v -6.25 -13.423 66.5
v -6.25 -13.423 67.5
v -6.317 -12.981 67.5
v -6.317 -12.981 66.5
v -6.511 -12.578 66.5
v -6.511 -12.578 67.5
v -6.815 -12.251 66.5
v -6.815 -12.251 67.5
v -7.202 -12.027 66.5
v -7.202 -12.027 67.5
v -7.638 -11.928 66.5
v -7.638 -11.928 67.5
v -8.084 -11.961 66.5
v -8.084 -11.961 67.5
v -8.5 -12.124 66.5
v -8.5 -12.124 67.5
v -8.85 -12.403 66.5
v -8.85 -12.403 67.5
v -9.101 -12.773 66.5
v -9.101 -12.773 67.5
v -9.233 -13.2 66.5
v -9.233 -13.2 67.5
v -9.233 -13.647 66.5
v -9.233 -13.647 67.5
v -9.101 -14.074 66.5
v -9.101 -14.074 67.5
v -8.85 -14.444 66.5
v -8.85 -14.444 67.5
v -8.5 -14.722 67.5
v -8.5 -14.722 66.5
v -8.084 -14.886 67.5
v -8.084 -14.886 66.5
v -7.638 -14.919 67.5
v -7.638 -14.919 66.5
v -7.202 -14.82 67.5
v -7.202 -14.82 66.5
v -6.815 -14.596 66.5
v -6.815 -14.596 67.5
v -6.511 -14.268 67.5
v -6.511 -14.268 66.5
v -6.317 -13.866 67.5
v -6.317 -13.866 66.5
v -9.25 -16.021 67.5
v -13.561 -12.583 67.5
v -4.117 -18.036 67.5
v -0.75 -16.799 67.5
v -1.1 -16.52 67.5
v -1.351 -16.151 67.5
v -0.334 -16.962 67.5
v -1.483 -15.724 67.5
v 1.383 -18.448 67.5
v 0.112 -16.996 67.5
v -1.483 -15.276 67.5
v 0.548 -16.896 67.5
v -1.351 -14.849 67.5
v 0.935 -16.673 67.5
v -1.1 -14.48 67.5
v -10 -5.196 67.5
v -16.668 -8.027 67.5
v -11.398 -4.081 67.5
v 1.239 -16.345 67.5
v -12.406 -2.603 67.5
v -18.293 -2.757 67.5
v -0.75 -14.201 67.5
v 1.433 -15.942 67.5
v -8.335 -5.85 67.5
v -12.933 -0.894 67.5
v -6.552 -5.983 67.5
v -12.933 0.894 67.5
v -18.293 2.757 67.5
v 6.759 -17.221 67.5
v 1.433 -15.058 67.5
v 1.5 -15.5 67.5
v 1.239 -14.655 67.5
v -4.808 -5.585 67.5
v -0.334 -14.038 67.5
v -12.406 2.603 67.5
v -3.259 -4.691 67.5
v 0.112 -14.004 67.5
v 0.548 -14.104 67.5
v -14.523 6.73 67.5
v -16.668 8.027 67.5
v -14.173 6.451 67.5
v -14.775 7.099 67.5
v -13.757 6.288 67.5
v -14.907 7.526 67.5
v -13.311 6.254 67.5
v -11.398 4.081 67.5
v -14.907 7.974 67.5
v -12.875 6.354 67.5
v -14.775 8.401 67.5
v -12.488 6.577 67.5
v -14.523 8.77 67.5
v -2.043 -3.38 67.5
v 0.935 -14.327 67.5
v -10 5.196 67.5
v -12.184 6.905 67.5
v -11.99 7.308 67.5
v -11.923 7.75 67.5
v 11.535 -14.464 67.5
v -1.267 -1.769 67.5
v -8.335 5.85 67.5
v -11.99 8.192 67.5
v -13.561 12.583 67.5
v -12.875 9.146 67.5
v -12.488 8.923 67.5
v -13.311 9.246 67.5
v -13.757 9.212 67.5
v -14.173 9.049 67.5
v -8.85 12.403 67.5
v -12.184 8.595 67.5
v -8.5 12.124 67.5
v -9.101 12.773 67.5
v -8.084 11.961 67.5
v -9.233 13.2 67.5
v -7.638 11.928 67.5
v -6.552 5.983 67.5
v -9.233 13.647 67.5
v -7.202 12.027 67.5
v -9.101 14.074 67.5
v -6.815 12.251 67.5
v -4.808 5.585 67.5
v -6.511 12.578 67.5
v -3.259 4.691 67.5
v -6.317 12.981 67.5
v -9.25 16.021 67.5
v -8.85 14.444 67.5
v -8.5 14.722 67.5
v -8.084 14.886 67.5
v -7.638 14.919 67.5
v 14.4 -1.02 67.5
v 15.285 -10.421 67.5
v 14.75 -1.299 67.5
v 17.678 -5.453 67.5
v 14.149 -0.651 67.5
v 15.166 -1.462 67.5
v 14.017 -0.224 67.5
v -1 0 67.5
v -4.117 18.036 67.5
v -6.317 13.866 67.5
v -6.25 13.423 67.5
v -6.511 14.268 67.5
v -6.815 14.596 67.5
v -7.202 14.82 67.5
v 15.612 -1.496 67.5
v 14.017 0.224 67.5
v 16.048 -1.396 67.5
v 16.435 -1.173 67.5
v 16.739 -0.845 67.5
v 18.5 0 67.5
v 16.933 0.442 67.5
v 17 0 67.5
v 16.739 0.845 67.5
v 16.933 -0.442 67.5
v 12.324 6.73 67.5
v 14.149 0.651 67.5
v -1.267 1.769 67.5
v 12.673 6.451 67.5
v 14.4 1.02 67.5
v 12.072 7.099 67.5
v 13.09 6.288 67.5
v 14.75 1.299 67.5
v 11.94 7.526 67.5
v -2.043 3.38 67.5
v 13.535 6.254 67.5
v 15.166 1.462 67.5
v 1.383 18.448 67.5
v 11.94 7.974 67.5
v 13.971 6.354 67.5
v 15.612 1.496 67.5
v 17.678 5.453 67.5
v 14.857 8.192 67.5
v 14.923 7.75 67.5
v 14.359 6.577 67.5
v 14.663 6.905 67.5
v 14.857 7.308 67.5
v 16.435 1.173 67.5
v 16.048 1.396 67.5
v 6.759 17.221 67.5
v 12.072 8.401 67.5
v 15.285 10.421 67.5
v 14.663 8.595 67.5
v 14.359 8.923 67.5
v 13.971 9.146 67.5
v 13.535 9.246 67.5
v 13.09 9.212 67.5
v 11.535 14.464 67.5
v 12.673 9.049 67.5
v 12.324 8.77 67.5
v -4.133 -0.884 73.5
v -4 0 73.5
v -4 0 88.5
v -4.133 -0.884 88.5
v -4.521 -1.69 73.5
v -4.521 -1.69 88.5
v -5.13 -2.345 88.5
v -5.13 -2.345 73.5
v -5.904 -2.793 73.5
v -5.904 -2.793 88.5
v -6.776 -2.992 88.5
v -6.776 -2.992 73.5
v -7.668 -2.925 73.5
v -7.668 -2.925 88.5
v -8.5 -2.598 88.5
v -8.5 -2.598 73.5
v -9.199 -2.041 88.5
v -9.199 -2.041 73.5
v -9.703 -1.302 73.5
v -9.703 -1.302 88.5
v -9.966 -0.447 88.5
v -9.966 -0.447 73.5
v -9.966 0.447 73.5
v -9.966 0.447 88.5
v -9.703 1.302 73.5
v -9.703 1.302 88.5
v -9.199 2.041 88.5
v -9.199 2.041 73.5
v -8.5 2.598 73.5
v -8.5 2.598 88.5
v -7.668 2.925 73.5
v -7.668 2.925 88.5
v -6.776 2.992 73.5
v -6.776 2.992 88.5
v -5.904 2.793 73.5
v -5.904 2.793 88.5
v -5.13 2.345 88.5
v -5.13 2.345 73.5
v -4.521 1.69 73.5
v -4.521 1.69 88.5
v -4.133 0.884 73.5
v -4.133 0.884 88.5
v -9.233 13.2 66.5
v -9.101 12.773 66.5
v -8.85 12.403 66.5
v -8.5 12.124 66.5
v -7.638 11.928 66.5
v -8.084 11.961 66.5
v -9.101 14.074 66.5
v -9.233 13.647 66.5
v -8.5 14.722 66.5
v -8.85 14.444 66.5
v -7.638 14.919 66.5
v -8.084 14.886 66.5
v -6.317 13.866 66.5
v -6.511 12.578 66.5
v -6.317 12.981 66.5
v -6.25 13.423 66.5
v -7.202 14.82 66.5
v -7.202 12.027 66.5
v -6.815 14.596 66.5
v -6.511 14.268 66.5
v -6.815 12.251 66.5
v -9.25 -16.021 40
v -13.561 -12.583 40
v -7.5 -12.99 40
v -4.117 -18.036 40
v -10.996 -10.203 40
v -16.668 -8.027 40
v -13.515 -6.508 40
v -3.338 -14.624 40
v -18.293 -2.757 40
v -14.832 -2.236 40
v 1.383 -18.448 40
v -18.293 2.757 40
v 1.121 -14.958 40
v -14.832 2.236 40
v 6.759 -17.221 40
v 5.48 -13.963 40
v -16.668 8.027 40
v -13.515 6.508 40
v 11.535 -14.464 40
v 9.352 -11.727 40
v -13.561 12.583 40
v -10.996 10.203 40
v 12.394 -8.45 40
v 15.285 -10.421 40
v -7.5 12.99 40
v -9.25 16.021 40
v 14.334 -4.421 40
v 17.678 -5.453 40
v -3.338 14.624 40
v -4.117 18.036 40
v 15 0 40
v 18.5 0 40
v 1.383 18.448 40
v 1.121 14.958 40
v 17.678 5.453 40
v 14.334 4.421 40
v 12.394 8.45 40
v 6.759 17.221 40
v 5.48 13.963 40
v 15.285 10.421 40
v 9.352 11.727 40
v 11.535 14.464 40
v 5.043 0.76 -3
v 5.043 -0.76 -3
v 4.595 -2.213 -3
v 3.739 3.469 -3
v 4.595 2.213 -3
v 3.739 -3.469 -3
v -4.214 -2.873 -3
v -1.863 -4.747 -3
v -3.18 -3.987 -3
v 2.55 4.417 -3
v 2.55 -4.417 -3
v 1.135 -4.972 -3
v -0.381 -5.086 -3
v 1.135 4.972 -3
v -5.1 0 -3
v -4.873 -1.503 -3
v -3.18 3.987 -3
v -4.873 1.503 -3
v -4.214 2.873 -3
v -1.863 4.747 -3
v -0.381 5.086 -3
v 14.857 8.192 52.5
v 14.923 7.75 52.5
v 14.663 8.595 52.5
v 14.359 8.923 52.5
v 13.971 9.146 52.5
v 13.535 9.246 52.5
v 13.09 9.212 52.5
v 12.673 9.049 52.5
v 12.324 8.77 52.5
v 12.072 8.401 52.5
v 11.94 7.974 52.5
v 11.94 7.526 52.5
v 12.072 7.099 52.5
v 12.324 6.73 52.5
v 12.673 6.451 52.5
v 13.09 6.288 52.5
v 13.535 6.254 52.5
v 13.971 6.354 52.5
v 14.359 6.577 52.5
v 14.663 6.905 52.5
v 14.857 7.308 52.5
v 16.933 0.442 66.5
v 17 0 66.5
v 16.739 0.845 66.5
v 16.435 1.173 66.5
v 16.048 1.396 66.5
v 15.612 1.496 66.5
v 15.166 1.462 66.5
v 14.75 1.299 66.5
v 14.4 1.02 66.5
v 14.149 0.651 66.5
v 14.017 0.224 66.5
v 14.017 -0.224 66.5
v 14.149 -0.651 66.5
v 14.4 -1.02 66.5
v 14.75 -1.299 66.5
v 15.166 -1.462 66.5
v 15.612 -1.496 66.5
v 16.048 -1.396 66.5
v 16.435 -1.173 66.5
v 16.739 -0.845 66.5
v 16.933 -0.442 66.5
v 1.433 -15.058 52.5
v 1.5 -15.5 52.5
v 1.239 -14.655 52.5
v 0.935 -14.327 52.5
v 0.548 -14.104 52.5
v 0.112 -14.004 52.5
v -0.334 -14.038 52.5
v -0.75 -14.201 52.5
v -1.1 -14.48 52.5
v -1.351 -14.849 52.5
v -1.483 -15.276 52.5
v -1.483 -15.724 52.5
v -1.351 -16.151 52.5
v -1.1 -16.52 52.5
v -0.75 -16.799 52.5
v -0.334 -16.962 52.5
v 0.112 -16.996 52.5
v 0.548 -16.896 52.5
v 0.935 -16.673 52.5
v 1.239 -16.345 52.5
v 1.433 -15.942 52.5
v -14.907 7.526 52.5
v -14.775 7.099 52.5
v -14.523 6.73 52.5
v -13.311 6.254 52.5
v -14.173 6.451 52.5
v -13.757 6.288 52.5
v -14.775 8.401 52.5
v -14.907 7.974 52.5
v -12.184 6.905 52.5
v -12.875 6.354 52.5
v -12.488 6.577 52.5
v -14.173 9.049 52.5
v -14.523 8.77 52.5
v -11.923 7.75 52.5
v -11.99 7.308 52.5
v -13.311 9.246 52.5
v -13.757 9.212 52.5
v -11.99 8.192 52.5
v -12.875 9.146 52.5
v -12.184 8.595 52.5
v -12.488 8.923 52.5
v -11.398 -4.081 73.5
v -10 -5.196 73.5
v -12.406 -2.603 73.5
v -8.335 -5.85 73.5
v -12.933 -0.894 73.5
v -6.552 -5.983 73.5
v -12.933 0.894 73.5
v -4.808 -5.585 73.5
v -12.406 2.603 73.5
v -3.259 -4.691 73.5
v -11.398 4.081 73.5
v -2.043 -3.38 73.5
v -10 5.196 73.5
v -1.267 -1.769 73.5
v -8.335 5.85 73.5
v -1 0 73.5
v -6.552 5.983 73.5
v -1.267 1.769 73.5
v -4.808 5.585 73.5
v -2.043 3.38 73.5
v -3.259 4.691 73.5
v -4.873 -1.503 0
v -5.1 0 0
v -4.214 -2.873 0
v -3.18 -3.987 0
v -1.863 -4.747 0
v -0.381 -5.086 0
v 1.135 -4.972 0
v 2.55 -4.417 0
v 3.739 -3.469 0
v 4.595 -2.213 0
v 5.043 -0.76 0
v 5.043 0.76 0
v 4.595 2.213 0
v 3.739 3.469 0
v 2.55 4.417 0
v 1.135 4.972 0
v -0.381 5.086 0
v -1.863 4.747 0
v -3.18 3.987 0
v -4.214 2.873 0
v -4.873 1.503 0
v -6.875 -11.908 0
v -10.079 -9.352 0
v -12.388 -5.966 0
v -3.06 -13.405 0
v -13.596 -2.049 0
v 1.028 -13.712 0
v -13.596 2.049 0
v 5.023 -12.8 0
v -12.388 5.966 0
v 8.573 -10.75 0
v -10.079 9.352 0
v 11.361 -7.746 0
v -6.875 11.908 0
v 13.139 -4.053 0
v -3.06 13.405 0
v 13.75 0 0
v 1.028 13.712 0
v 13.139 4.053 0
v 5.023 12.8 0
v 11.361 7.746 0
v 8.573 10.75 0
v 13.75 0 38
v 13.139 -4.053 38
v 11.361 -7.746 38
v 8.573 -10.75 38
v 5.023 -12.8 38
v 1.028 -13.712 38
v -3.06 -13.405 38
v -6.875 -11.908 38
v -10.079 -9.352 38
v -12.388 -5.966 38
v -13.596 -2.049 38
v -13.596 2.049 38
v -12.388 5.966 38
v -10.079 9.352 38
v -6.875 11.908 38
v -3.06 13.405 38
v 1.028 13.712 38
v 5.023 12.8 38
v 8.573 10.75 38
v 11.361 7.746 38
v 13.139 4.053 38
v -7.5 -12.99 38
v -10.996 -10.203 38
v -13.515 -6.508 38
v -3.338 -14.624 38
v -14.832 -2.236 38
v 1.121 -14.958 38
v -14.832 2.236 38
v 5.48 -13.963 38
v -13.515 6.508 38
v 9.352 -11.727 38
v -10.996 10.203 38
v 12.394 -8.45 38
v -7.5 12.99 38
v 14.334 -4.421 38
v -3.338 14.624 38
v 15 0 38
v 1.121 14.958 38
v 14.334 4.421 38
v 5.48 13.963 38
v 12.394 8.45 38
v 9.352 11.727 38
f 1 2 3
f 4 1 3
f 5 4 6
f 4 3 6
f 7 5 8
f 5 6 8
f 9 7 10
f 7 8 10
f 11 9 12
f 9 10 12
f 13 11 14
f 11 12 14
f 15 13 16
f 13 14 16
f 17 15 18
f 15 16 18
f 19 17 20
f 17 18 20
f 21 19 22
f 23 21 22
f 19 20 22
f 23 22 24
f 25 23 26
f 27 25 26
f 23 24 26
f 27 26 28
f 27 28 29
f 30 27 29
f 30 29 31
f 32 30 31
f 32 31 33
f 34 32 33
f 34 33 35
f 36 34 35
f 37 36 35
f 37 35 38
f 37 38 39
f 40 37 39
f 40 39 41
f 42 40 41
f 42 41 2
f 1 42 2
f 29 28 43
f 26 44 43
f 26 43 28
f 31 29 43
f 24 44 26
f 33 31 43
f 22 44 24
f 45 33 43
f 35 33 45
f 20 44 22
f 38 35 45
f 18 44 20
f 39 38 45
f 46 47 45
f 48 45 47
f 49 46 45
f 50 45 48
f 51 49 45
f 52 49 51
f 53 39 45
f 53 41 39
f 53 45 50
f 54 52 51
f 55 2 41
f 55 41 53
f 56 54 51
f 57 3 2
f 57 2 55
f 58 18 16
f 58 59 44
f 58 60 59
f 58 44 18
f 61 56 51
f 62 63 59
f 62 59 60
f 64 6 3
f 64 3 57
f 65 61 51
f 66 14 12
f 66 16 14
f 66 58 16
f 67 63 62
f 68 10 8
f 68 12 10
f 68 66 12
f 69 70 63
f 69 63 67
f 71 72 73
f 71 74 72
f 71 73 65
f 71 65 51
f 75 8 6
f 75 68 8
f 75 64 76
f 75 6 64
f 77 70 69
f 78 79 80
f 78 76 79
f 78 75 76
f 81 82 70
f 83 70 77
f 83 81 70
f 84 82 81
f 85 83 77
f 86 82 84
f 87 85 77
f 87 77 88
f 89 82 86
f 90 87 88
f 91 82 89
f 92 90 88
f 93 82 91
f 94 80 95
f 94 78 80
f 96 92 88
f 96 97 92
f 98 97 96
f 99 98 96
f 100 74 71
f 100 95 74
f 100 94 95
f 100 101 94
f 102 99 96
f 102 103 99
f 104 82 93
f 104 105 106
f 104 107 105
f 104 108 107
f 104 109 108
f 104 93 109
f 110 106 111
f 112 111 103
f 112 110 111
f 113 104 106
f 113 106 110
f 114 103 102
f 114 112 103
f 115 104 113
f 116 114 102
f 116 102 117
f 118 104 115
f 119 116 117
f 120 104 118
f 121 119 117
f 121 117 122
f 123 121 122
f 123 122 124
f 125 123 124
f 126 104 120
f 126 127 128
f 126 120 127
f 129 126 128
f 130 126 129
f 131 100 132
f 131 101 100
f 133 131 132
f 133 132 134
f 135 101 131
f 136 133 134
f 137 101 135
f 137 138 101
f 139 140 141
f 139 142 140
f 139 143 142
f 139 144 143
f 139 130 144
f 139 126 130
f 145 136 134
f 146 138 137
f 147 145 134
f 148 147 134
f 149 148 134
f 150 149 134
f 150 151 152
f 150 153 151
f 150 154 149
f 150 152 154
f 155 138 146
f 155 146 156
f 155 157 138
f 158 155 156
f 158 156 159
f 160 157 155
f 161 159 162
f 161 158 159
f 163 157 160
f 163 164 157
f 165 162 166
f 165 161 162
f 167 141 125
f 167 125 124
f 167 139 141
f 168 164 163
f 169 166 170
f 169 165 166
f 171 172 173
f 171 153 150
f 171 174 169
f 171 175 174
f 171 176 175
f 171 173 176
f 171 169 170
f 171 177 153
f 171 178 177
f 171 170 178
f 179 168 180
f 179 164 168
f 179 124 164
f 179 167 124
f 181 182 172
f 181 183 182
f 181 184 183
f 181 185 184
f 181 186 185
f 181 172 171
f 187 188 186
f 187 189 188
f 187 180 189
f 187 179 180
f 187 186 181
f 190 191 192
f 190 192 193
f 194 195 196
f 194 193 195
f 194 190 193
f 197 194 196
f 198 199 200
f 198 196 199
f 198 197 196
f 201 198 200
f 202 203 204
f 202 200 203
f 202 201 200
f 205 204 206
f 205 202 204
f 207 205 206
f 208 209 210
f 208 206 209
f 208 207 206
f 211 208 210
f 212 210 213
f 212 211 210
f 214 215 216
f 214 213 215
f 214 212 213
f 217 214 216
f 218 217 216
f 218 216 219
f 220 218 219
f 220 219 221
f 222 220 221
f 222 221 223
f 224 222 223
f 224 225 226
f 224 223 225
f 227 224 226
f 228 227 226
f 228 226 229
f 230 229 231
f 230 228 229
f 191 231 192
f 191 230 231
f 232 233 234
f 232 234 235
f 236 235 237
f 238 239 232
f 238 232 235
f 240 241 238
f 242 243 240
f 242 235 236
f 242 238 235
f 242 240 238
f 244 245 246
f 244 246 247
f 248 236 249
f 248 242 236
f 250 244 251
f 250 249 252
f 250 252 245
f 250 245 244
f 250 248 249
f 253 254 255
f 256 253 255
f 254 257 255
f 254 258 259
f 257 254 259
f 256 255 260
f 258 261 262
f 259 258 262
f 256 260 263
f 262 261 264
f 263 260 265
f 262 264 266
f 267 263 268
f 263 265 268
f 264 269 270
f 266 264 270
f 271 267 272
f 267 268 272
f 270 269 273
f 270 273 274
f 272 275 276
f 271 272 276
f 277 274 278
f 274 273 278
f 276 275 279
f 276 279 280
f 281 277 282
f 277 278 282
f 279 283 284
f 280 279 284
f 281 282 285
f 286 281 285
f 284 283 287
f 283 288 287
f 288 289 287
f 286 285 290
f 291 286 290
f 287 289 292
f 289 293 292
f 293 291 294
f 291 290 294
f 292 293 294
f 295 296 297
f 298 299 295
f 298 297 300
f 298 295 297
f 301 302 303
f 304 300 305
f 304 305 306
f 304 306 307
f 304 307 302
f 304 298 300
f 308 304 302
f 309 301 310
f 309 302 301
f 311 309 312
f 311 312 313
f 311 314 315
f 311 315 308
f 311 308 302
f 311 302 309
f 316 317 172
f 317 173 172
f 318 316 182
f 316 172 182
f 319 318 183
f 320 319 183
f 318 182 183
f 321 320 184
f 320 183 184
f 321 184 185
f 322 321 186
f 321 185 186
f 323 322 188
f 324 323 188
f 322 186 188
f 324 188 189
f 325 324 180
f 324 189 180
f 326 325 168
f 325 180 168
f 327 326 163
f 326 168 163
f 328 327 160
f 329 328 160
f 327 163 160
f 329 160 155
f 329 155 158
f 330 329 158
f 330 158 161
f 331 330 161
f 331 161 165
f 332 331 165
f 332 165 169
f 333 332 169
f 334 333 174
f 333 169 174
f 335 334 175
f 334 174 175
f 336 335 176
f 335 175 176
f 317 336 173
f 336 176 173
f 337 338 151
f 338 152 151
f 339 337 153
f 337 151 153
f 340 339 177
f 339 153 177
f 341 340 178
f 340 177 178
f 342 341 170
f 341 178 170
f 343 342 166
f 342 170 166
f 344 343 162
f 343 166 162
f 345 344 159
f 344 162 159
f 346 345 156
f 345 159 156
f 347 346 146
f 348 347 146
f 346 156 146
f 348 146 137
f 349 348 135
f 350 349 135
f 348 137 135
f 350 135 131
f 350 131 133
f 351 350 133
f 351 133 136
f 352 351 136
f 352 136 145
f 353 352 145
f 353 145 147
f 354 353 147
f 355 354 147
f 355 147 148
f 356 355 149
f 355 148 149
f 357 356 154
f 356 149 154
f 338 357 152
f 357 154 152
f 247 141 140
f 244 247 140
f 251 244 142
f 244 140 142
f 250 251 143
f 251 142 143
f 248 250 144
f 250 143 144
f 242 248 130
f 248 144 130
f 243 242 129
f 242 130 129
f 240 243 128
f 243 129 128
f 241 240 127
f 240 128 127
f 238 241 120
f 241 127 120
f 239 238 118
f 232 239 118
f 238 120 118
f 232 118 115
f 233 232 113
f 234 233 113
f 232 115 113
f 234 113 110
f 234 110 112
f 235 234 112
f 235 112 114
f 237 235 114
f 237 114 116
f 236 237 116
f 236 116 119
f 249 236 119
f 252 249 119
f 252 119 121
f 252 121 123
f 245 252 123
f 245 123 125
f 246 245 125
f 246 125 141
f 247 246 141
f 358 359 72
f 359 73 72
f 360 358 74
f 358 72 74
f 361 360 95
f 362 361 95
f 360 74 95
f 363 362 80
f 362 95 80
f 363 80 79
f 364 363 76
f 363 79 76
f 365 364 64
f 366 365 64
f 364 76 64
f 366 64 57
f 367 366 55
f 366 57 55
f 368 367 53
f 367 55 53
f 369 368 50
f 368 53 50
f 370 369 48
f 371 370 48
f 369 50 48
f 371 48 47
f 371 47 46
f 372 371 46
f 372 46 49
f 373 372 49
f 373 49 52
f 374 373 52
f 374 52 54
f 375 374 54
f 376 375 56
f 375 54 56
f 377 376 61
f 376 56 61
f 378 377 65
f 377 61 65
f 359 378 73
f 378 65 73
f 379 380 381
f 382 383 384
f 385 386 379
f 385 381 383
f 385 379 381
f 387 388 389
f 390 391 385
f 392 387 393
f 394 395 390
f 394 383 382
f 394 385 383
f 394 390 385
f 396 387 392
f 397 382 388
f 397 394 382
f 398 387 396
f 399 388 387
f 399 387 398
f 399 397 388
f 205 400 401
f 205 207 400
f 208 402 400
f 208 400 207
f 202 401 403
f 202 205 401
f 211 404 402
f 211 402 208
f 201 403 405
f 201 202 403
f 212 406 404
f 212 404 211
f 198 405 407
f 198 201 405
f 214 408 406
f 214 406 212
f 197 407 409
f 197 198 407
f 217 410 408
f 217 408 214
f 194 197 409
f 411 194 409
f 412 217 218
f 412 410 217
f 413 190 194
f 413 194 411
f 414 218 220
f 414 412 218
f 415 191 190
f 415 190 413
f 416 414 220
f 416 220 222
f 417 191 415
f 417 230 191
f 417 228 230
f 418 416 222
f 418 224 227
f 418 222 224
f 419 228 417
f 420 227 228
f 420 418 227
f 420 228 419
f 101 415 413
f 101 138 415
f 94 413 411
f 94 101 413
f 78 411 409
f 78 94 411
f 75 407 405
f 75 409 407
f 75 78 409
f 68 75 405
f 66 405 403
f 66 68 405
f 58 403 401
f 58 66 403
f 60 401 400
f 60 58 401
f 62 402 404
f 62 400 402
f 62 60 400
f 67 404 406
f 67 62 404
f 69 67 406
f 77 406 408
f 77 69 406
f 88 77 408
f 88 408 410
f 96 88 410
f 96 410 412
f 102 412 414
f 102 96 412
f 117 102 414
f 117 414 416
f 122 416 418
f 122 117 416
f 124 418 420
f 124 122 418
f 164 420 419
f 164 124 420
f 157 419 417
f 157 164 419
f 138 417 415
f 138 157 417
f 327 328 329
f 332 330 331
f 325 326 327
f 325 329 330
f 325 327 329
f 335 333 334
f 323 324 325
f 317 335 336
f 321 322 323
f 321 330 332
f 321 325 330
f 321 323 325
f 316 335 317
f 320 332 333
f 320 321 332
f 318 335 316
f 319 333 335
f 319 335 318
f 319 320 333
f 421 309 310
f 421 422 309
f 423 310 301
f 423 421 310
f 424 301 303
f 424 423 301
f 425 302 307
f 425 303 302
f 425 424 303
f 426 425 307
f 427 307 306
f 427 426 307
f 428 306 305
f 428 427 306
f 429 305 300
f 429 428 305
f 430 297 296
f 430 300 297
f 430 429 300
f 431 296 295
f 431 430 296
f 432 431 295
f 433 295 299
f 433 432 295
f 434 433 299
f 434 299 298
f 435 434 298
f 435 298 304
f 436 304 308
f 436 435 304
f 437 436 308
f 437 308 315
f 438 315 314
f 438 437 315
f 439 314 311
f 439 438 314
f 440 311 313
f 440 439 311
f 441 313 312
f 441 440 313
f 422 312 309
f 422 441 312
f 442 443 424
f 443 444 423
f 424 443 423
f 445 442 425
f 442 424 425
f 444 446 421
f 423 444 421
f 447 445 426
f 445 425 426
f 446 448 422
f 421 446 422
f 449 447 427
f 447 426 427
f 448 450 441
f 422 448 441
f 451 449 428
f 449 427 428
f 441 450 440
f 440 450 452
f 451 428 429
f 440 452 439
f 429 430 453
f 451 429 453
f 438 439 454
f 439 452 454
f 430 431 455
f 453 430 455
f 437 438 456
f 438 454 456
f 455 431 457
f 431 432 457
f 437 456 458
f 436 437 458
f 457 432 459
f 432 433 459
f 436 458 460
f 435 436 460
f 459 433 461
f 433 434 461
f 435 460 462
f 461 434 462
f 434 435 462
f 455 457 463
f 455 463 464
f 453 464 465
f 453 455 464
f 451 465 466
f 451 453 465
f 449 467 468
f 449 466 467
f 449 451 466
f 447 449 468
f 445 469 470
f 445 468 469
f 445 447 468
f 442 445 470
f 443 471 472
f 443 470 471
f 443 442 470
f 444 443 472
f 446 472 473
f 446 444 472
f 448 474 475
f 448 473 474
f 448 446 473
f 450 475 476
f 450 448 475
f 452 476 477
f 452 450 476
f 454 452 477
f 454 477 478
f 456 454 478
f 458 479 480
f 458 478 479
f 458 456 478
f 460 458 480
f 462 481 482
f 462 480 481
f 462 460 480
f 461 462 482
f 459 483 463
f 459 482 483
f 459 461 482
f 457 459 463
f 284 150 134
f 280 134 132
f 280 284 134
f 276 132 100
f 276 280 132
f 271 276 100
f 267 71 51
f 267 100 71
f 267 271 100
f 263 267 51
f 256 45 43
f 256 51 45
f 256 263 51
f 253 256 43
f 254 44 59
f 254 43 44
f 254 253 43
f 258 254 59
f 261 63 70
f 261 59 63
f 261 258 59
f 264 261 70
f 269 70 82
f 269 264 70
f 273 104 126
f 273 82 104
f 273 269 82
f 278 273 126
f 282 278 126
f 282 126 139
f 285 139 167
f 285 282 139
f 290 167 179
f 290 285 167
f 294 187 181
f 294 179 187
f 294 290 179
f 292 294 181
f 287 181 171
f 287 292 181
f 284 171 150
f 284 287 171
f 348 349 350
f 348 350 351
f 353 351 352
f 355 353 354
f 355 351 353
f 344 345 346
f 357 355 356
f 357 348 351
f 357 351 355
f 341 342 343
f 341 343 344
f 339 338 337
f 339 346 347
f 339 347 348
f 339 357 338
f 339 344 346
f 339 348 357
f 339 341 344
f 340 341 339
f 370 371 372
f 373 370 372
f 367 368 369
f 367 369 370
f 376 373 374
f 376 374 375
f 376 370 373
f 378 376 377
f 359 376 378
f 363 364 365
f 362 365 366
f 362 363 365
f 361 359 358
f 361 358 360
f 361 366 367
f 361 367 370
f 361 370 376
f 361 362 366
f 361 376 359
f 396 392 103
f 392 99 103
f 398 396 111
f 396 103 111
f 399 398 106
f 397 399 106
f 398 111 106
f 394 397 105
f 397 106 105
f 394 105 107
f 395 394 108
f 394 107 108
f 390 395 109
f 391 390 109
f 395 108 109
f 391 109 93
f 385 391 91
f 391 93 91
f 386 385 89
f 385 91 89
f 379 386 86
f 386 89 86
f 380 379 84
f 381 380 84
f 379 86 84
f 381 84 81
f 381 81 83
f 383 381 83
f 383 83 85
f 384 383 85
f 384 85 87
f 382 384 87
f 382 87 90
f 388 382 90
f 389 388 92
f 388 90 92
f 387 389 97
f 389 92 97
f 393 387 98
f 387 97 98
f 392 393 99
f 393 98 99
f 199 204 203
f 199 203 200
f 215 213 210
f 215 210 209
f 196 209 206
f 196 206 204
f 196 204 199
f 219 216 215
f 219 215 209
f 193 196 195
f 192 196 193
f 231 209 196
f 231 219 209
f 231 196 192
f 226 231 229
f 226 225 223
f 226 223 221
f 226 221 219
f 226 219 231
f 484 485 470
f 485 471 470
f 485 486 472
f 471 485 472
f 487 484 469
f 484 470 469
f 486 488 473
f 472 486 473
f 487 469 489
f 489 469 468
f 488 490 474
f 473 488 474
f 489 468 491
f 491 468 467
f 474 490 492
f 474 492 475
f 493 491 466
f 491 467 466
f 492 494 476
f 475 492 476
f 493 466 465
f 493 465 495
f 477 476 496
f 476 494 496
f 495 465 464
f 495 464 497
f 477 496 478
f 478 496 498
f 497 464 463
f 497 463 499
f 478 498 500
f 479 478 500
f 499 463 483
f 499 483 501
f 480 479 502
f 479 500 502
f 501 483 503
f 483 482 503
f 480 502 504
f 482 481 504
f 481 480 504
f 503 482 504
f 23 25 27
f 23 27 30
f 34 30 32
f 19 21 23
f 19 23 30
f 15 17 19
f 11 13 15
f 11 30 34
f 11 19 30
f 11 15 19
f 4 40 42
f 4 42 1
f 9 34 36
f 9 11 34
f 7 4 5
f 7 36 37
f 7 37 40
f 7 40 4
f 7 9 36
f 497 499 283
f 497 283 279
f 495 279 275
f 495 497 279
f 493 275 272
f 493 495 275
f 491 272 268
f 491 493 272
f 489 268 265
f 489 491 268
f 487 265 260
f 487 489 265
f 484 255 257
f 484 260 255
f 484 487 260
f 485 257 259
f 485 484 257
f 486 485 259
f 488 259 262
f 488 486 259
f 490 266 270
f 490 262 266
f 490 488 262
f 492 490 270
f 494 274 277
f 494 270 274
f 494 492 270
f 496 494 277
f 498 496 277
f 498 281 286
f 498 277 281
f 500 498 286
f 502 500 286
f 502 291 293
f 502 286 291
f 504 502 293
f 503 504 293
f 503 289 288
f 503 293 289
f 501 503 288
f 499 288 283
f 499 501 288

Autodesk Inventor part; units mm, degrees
ref_plane "YZ Plane" through (0, 0, 0) normal (1, 0, 0) x (0, 1, 0)
ref_plane "XZ Plane" through (0, 0, 0) normal (0, 1, 0) x (-1, 0, 0)
ref_plane "XY Plane" through (0, 0, 0) normal (0, 0, 1) x (1, 0, 0)
sketch "スケッチ1" plane through (0, 0, 0) normal (0, 0, 1) x (1, 0, 0)
  circle A0 centre (0, 0) radius 13.75
  dimension "d0" = 27.5
extrude "押し出し1" add sketch "スケッチ1" along normal blind 38
sketch "スケッチ2" plane through (0, 0, 38) normal (0, 0, 1) x (1, 0, 0)
  circle A0 centre (0, 0) radius 15
  dimension "d3" = 30
extrude "押し出し2" add sketch "スケッチ2" along normal blind 2
sketch "スケッチ3" plane through (0, 0, 40) normal (0, 0, 1) x (1, 0, 0)
  circle A0 centre (0, 0) radius 18.5
  dimension "d6" = 37
extrude "押し出し3" add sketch "スケッチ3" along normal blind 27.5
sketch "スケッチ4" plane through (0, 0, 0) normal (0, 0, -1) x (-1, 0, 0)
  circle A0 centre (0, 0) radius 5.1
  dimension "d9" = 10.2
extrude "押し出し4" add sketch "スケッチ4" along normal blind 3
sketch "スケッチ5" plane through (0, 0, 67.5) normal (0, 0, 1) x (1, 0, 0)
  circle A0 centre (-7, 0) radius 6
  point P0 (0, 0)
  dimension "d12" = 12
extrude "押し出し5" add sketch "スケッチ5" along normal blind 6
sketch "スケッチ6" plane through (-7, 0, 73.5) normal (0, 0, 1) x (1, 0, 0)
  circle A0 centre (0, 0) radius 3
  point P0 (7, 0)
  dimension "d15" = 6
extrude "押し出し6" add sketch "スケッチ6" along normal blind 15
sketch "スケッチ7" plane through (0, 0, 67.5) normal (0, 0, 1) x (1, 0, 0)
  circle A0 centre (-7.75, -13.4234) radius 1.5
  circle A1 centre (-7.75, 13.4234) radius 1.5
  circle A2 centre (15.5, 0) radius 1.5
  circle A3 centre (0, -15.5) radius 1.5
  circle A4 centre (-13.4234, 7.75) radius 1.5
  circle A5 centre (13.4234, 7.75) radius 1.5
  point P0 (0, 0)
  point P1 (0, 0)
  point P2 (0, 0)
  dimension "d19" = 3
  dimension "d20" = 3
  dimension "d21" = 3
  dimension "d22" = 3
  dimension "d23" = 3
  dimension "d24" = 3
extrude "押し出し7" cut sketch "スケッチ7" against normal blind 15 contours A3 | A4 | A5
sketch "スケッチ8" plane through (0, 0, 67.5) normal (0, 0, 1) x (1, 0, 0)
  circle A0 centre (-7.75, -13.4234) radius 1.5
  circle A1 centre (-7.75, 13.4234) radius 1.5
  circle A2 centre (15.5, 0) radius 1.5
  circle A3 centre (0, -15.5) radius 1.5
  circle A4 centre (-13.4234, 7.75) radius 1.5
  circle A5 centre (13.4234, 7.75) radius 1.5
  point P0 (0, 0)
  point P1 (0, 0)
  point P2 (0, 0)
  point P3 (0, 0)
  dimension "d27" = 3
  dimension "d28" = 3
  dimension "d29" = 3
  dimension "d30" = 3
  dimension "d31" = 3
  dimension "d32" = 3
extrude "押し出し8" cut sketch "スケッチ8" against normal blind 1 contours A0 | A1 | A2
properties part number "380-300c1" material "ステンレス鋼"
